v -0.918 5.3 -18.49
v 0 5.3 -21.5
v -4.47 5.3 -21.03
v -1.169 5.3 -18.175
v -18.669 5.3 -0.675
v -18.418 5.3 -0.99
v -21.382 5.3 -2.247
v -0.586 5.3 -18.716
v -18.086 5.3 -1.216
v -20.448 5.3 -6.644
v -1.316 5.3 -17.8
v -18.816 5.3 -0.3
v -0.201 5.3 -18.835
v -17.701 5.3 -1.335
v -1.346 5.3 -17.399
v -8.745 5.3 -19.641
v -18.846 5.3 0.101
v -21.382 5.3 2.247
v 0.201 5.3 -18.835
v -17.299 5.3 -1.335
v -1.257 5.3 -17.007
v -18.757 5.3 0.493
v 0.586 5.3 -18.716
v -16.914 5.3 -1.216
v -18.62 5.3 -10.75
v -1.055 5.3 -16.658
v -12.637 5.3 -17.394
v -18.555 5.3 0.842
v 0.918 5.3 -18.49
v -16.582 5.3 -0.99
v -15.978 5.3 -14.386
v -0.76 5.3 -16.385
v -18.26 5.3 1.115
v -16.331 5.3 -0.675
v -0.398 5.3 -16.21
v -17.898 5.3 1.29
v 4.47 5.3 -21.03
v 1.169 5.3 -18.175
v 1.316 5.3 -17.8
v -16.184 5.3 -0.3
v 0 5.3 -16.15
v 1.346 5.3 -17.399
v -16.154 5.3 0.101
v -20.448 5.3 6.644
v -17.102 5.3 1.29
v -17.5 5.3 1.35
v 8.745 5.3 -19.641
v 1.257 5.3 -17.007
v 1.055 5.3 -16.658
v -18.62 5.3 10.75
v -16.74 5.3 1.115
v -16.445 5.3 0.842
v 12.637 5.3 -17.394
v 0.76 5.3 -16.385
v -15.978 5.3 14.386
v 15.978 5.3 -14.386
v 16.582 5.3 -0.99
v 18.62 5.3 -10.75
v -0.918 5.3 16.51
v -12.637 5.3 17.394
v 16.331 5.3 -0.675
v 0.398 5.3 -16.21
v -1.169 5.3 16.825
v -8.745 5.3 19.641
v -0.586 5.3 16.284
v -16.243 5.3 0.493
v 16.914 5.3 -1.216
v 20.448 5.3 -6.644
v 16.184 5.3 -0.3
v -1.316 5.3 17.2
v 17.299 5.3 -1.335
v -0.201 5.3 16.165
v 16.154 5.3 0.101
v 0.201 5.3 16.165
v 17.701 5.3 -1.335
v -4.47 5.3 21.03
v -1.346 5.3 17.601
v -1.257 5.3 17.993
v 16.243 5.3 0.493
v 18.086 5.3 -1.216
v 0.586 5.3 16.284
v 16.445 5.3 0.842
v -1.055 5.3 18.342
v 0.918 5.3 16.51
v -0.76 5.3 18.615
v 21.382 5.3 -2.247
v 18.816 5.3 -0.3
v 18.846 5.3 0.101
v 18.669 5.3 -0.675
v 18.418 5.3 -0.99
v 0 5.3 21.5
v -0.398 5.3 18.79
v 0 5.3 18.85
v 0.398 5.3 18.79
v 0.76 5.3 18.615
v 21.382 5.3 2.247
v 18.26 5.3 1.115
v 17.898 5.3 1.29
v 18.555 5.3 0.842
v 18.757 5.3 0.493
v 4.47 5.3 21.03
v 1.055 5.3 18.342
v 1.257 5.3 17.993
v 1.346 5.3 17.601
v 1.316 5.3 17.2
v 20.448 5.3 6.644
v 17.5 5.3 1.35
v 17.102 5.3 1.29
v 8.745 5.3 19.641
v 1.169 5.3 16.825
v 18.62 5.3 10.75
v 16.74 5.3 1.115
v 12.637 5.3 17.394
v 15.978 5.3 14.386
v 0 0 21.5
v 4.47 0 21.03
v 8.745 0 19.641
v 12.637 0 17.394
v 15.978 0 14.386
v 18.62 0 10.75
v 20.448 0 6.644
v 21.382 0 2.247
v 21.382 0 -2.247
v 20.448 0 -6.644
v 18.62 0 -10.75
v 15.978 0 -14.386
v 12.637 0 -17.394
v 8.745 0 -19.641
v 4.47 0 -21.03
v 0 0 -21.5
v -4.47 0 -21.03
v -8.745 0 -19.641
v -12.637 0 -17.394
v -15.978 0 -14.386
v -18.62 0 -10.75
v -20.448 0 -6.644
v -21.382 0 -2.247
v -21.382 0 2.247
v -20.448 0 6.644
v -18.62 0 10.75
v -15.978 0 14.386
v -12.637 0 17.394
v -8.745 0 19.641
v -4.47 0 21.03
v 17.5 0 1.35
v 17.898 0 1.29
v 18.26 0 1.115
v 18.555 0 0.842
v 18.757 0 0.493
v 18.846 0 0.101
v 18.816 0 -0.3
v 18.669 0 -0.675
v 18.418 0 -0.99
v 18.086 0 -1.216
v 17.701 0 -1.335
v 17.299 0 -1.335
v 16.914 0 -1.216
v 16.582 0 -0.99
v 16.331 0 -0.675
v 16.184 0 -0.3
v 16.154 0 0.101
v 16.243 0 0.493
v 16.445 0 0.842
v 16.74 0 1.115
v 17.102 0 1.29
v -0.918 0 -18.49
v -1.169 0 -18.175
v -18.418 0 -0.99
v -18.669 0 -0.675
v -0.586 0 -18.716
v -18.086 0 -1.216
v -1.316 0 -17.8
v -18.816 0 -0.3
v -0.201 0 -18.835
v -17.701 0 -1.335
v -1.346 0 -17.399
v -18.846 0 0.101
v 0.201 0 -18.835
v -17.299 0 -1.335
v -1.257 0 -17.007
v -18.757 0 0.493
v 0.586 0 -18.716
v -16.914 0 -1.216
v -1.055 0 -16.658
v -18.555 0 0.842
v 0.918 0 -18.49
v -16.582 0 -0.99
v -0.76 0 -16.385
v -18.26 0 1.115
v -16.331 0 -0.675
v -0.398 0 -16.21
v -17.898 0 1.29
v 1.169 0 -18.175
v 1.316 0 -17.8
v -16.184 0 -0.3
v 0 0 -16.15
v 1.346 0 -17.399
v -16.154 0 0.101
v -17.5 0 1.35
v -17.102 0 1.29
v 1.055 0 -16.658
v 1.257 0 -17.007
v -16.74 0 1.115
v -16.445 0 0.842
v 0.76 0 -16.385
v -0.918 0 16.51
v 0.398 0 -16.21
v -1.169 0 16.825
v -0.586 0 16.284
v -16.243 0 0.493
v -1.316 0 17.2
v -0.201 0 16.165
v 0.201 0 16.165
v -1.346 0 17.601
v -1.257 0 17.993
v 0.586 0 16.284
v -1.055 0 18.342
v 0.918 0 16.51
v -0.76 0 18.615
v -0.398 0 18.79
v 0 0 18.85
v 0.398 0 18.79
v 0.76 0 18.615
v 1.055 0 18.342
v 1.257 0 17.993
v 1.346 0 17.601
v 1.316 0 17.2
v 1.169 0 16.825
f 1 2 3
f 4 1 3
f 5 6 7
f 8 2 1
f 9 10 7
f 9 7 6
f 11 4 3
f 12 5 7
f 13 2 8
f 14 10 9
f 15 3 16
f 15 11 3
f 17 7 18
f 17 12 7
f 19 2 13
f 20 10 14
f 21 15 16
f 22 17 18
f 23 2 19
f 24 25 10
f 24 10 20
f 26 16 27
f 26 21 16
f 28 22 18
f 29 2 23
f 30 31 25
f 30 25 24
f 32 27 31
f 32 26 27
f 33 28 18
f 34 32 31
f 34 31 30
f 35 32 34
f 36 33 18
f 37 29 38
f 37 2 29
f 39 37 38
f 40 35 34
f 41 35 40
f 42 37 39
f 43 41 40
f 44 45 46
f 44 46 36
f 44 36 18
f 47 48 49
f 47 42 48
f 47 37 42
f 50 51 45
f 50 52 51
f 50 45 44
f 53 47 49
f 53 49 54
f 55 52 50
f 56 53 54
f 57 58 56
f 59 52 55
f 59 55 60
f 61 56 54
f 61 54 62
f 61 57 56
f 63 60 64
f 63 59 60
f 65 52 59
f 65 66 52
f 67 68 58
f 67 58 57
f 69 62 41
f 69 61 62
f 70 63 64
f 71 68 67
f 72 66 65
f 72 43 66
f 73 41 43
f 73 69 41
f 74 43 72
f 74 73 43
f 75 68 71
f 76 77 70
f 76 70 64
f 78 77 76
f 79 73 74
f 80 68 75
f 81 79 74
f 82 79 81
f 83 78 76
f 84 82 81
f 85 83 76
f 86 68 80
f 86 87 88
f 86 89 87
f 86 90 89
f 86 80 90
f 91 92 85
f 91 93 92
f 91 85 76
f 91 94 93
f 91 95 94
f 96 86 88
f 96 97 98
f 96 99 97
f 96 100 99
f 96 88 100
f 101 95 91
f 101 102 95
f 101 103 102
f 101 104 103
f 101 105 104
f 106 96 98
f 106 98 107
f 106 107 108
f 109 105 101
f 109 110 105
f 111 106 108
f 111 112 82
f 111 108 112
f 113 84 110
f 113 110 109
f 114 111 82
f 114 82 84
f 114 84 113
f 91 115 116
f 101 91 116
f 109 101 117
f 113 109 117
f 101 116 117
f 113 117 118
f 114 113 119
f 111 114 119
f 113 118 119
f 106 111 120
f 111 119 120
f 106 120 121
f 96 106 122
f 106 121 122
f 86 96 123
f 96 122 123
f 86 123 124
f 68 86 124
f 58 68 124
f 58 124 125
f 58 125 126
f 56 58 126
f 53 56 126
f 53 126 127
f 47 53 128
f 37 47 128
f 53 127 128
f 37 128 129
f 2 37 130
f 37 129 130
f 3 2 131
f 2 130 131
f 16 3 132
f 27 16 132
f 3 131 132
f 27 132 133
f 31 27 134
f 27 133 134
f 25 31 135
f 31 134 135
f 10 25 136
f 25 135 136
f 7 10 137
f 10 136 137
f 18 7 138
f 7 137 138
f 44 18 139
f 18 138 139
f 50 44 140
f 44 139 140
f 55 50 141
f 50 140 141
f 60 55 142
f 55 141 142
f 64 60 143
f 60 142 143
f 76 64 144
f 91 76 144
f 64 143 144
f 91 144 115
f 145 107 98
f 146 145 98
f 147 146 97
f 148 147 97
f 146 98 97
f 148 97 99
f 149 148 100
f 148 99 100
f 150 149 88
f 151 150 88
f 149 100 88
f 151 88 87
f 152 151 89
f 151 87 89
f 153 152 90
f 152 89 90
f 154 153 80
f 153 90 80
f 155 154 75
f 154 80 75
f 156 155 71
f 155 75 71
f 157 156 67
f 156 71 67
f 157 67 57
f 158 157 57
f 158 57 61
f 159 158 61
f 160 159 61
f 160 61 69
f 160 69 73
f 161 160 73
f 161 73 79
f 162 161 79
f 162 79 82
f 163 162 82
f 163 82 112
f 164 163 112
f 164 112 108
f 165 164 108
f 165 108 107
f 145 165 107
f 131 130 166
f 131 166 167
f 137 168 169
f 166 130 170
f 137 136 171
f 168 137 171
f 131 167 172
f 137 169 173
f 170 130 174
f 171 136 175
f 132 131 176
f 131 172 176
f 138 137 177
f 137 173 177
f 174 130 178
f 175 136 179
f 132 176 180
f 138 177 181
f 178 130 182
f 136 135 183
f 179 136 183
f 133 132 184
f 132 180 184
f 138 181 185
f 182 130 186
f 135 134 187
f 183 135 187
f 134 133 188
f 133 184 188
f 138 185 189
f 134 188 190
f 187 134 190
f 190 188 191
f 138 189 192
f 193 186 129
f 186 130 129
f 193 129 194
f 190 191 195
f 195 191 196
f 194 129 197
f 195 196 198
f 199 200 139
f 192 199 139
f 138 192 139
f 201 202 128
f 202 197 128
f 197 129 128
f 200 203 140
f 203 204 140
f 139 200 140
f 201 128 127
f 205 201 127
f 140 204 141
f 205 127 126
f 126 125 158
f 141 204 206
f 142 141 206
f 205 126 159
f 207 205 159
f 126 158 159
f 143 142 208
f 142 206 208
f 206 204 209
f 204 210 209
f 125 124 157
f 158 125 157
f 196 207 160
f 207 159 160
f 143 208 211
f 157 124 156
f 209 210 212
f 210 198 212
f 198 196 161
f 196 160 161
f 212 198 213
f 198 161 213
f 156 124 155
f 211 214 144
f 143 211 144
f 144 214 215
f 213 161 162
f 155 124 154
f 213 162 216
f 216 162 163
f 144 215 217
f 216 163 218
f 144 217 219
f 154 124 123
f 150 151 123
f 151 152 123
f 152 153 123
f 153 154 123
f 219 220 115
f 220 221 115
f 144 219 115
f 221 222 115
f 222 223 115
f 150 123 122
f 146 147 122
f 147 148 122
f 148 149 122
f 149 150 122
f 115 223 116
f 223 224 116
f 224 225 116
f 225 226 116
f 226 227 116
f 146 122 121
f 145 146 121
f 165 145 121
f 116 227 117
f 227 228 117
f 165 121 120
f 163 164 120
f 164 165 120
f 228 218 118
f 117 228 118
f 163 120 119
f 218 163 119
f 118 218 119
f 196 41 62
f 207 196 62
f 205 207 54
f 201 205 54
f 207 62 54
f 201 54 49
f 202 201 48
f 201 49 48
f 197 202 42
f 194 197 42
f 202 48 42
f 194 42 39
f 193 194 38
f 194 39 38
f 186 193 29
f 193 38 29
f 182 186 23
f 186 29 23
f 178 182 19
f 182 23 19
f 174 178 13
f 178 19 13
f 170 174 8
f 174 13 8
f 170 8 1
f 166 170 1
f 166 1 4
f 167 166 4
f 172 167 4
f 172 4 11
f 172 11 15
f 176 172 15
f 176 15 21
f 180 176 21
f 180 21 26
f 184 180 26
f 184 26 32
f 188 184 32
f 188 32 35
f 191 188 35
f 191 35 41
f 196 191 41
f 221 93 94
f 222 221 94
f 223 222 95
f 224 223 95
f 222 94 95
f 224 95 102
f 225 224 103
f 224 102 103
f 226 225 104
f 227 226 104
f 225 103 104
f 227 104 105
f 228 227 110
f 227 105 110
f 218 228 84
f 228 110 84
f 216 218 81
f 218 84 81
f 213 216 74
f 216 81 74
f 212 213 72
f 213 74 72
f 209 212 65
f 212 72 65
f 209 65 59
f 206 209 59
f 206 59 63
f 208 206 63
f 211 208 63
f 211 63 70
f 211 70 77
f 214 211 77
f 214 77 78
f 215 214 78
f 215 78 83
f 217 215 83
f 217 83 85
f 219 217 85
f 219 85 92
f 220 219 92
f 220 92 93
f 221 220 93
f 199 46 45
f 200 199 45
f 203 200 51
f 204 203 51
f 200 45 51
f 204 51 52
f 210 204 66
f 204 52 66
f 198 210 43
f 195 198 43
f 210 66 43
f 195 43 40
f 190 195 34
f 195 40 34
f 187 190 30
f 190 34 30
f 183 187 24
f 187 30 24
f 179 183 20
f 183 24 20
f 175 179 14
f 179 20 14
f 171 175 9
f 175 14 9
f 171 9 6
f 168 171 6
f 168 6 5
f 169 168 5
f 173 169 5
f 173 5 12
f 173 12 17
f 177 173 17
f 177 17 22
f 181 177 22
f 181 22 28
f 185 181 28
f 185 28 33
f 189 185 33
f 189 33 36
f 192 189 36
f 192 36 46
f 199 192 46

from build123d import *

# Parameters (mm, degrees)
SKETCH_1_R          = 21.5
EXTRUDE_1_DEPTH     = 5.3
CUT_EXTRUDE_1_REACH = 32.864
SKETCH_2_R          = 1.35


with BuildPart() as part:
    # 草图1 → 凸台-拉伸1 (new body)
    with BuildSketch(Plane(origin=(0, 0, 0), x_dir=(1, 0, 0), z_dir=(0, 1, 0))):
        with Locations(Location((0, 0, 0), (0, 0, 270))):
            Circle(SKETCH_1_R)
    extrude(amount=EXTRUDE_1_DEPTH)

    # 草图2 → 切除-拉伸1 (cut, up to next)
    with BuildSketch(Plane(origin=(0, 5.3, 0), x_dir=(1, 0, 0), z_dir=(0, 1, 0)), mode=Mode.PRIVATE) as cut_extrude_1_sk1:
        with Locations(Location((-17.5, 0, 0), (0, 0, 270))):
            Circle(SKETCH_2_R)
    cut_extrude_1_tool1 = extrude(cut_extrude_1_sk1.sketch, amount=-CUT_EXTRUDE_1_REACH, mode=Mode.PRIVATE) & part.part
    # 草图2 → 切除-拉伸1 (cut, up to next)
    with BuildSketch(Plane(origin=(0, 5.3, 0), x_dir=(1, 0, 0), z_dir=(0, 1, 0)), mode=Mode.PRIVATE) as cut_extrude_1_sk2:
        with Locations(Location((0, 17.5, 0), (0, 0, 270))):
            Circle(SKETCH_2_R)
    cut_extrude_1_tool2 = extrude(cut_extrude_1_sk2.sketch, amount=-CUT_EXTRUDE_1_REACH, mode=Mode.PRIVATE) & part.part
    # 草图2 → 切除-拉伸1 (cut, up to next)
    with BuildSketch(Plane(origin=(0, 5.3, 0), x_dir=(1, 0, 0), z_dir=(0, 1, 0)), mode=Mode.PRIVATE) as cut_extrude_1_sk3:
        with Locations(Location((17.5, 0, 0), (0, 0, 270))):
            Circle(SKETCH_2_R)
    cut_extrude_1_tool3 = extrude(cut_extrude_1_sk3.sketch, amount=-CUT_EXTRUDE_1_REACH, mode=Mode.PRIVATE) & part.part
    # 草图2 → 切除-拉伸1 (cut, up to next)
    with BuildSketch(Plane(origin=(0, 5.3, 0), x_dir=(1, 0, 0), z_dir=(0, 1, 0)), mode=Mode.PRIVATE) as cut_extrude_1_sk4:
        with Locations(Location((0, -17.5, 0), (0, 0, 270))):
            Circle(SKETCH_2_R)
    cut_extrude_1_tool4 = extrude(cut_extrude_1_sk4.sketch, amount=-CUT_EXTRUDE_1_REACH, mode=Mode.PRIVATE) & part.part
    add(cut_extrude_1_tool1.solids().sort_by_distance((-17.5, 5.3, 0))[0], mode=Mode.SUBTRACT)
    add(cut_extrude_1_tool2.solids().sort_by_distance((0, 5.3, -17.5))[0], mode=Mode.SUBTRACT)
    add(cut_extrude_1_tool3.solids().sort_by_distance((17.5, 5.3, 0))[0], mode=Mode.SUBTRACT)
    add(cut_extrude_1_tool4.solids().sort_by_distance((0, 5.3, 17.5))[0], mode=Mode.SUBTRACT)


solid = part.part
